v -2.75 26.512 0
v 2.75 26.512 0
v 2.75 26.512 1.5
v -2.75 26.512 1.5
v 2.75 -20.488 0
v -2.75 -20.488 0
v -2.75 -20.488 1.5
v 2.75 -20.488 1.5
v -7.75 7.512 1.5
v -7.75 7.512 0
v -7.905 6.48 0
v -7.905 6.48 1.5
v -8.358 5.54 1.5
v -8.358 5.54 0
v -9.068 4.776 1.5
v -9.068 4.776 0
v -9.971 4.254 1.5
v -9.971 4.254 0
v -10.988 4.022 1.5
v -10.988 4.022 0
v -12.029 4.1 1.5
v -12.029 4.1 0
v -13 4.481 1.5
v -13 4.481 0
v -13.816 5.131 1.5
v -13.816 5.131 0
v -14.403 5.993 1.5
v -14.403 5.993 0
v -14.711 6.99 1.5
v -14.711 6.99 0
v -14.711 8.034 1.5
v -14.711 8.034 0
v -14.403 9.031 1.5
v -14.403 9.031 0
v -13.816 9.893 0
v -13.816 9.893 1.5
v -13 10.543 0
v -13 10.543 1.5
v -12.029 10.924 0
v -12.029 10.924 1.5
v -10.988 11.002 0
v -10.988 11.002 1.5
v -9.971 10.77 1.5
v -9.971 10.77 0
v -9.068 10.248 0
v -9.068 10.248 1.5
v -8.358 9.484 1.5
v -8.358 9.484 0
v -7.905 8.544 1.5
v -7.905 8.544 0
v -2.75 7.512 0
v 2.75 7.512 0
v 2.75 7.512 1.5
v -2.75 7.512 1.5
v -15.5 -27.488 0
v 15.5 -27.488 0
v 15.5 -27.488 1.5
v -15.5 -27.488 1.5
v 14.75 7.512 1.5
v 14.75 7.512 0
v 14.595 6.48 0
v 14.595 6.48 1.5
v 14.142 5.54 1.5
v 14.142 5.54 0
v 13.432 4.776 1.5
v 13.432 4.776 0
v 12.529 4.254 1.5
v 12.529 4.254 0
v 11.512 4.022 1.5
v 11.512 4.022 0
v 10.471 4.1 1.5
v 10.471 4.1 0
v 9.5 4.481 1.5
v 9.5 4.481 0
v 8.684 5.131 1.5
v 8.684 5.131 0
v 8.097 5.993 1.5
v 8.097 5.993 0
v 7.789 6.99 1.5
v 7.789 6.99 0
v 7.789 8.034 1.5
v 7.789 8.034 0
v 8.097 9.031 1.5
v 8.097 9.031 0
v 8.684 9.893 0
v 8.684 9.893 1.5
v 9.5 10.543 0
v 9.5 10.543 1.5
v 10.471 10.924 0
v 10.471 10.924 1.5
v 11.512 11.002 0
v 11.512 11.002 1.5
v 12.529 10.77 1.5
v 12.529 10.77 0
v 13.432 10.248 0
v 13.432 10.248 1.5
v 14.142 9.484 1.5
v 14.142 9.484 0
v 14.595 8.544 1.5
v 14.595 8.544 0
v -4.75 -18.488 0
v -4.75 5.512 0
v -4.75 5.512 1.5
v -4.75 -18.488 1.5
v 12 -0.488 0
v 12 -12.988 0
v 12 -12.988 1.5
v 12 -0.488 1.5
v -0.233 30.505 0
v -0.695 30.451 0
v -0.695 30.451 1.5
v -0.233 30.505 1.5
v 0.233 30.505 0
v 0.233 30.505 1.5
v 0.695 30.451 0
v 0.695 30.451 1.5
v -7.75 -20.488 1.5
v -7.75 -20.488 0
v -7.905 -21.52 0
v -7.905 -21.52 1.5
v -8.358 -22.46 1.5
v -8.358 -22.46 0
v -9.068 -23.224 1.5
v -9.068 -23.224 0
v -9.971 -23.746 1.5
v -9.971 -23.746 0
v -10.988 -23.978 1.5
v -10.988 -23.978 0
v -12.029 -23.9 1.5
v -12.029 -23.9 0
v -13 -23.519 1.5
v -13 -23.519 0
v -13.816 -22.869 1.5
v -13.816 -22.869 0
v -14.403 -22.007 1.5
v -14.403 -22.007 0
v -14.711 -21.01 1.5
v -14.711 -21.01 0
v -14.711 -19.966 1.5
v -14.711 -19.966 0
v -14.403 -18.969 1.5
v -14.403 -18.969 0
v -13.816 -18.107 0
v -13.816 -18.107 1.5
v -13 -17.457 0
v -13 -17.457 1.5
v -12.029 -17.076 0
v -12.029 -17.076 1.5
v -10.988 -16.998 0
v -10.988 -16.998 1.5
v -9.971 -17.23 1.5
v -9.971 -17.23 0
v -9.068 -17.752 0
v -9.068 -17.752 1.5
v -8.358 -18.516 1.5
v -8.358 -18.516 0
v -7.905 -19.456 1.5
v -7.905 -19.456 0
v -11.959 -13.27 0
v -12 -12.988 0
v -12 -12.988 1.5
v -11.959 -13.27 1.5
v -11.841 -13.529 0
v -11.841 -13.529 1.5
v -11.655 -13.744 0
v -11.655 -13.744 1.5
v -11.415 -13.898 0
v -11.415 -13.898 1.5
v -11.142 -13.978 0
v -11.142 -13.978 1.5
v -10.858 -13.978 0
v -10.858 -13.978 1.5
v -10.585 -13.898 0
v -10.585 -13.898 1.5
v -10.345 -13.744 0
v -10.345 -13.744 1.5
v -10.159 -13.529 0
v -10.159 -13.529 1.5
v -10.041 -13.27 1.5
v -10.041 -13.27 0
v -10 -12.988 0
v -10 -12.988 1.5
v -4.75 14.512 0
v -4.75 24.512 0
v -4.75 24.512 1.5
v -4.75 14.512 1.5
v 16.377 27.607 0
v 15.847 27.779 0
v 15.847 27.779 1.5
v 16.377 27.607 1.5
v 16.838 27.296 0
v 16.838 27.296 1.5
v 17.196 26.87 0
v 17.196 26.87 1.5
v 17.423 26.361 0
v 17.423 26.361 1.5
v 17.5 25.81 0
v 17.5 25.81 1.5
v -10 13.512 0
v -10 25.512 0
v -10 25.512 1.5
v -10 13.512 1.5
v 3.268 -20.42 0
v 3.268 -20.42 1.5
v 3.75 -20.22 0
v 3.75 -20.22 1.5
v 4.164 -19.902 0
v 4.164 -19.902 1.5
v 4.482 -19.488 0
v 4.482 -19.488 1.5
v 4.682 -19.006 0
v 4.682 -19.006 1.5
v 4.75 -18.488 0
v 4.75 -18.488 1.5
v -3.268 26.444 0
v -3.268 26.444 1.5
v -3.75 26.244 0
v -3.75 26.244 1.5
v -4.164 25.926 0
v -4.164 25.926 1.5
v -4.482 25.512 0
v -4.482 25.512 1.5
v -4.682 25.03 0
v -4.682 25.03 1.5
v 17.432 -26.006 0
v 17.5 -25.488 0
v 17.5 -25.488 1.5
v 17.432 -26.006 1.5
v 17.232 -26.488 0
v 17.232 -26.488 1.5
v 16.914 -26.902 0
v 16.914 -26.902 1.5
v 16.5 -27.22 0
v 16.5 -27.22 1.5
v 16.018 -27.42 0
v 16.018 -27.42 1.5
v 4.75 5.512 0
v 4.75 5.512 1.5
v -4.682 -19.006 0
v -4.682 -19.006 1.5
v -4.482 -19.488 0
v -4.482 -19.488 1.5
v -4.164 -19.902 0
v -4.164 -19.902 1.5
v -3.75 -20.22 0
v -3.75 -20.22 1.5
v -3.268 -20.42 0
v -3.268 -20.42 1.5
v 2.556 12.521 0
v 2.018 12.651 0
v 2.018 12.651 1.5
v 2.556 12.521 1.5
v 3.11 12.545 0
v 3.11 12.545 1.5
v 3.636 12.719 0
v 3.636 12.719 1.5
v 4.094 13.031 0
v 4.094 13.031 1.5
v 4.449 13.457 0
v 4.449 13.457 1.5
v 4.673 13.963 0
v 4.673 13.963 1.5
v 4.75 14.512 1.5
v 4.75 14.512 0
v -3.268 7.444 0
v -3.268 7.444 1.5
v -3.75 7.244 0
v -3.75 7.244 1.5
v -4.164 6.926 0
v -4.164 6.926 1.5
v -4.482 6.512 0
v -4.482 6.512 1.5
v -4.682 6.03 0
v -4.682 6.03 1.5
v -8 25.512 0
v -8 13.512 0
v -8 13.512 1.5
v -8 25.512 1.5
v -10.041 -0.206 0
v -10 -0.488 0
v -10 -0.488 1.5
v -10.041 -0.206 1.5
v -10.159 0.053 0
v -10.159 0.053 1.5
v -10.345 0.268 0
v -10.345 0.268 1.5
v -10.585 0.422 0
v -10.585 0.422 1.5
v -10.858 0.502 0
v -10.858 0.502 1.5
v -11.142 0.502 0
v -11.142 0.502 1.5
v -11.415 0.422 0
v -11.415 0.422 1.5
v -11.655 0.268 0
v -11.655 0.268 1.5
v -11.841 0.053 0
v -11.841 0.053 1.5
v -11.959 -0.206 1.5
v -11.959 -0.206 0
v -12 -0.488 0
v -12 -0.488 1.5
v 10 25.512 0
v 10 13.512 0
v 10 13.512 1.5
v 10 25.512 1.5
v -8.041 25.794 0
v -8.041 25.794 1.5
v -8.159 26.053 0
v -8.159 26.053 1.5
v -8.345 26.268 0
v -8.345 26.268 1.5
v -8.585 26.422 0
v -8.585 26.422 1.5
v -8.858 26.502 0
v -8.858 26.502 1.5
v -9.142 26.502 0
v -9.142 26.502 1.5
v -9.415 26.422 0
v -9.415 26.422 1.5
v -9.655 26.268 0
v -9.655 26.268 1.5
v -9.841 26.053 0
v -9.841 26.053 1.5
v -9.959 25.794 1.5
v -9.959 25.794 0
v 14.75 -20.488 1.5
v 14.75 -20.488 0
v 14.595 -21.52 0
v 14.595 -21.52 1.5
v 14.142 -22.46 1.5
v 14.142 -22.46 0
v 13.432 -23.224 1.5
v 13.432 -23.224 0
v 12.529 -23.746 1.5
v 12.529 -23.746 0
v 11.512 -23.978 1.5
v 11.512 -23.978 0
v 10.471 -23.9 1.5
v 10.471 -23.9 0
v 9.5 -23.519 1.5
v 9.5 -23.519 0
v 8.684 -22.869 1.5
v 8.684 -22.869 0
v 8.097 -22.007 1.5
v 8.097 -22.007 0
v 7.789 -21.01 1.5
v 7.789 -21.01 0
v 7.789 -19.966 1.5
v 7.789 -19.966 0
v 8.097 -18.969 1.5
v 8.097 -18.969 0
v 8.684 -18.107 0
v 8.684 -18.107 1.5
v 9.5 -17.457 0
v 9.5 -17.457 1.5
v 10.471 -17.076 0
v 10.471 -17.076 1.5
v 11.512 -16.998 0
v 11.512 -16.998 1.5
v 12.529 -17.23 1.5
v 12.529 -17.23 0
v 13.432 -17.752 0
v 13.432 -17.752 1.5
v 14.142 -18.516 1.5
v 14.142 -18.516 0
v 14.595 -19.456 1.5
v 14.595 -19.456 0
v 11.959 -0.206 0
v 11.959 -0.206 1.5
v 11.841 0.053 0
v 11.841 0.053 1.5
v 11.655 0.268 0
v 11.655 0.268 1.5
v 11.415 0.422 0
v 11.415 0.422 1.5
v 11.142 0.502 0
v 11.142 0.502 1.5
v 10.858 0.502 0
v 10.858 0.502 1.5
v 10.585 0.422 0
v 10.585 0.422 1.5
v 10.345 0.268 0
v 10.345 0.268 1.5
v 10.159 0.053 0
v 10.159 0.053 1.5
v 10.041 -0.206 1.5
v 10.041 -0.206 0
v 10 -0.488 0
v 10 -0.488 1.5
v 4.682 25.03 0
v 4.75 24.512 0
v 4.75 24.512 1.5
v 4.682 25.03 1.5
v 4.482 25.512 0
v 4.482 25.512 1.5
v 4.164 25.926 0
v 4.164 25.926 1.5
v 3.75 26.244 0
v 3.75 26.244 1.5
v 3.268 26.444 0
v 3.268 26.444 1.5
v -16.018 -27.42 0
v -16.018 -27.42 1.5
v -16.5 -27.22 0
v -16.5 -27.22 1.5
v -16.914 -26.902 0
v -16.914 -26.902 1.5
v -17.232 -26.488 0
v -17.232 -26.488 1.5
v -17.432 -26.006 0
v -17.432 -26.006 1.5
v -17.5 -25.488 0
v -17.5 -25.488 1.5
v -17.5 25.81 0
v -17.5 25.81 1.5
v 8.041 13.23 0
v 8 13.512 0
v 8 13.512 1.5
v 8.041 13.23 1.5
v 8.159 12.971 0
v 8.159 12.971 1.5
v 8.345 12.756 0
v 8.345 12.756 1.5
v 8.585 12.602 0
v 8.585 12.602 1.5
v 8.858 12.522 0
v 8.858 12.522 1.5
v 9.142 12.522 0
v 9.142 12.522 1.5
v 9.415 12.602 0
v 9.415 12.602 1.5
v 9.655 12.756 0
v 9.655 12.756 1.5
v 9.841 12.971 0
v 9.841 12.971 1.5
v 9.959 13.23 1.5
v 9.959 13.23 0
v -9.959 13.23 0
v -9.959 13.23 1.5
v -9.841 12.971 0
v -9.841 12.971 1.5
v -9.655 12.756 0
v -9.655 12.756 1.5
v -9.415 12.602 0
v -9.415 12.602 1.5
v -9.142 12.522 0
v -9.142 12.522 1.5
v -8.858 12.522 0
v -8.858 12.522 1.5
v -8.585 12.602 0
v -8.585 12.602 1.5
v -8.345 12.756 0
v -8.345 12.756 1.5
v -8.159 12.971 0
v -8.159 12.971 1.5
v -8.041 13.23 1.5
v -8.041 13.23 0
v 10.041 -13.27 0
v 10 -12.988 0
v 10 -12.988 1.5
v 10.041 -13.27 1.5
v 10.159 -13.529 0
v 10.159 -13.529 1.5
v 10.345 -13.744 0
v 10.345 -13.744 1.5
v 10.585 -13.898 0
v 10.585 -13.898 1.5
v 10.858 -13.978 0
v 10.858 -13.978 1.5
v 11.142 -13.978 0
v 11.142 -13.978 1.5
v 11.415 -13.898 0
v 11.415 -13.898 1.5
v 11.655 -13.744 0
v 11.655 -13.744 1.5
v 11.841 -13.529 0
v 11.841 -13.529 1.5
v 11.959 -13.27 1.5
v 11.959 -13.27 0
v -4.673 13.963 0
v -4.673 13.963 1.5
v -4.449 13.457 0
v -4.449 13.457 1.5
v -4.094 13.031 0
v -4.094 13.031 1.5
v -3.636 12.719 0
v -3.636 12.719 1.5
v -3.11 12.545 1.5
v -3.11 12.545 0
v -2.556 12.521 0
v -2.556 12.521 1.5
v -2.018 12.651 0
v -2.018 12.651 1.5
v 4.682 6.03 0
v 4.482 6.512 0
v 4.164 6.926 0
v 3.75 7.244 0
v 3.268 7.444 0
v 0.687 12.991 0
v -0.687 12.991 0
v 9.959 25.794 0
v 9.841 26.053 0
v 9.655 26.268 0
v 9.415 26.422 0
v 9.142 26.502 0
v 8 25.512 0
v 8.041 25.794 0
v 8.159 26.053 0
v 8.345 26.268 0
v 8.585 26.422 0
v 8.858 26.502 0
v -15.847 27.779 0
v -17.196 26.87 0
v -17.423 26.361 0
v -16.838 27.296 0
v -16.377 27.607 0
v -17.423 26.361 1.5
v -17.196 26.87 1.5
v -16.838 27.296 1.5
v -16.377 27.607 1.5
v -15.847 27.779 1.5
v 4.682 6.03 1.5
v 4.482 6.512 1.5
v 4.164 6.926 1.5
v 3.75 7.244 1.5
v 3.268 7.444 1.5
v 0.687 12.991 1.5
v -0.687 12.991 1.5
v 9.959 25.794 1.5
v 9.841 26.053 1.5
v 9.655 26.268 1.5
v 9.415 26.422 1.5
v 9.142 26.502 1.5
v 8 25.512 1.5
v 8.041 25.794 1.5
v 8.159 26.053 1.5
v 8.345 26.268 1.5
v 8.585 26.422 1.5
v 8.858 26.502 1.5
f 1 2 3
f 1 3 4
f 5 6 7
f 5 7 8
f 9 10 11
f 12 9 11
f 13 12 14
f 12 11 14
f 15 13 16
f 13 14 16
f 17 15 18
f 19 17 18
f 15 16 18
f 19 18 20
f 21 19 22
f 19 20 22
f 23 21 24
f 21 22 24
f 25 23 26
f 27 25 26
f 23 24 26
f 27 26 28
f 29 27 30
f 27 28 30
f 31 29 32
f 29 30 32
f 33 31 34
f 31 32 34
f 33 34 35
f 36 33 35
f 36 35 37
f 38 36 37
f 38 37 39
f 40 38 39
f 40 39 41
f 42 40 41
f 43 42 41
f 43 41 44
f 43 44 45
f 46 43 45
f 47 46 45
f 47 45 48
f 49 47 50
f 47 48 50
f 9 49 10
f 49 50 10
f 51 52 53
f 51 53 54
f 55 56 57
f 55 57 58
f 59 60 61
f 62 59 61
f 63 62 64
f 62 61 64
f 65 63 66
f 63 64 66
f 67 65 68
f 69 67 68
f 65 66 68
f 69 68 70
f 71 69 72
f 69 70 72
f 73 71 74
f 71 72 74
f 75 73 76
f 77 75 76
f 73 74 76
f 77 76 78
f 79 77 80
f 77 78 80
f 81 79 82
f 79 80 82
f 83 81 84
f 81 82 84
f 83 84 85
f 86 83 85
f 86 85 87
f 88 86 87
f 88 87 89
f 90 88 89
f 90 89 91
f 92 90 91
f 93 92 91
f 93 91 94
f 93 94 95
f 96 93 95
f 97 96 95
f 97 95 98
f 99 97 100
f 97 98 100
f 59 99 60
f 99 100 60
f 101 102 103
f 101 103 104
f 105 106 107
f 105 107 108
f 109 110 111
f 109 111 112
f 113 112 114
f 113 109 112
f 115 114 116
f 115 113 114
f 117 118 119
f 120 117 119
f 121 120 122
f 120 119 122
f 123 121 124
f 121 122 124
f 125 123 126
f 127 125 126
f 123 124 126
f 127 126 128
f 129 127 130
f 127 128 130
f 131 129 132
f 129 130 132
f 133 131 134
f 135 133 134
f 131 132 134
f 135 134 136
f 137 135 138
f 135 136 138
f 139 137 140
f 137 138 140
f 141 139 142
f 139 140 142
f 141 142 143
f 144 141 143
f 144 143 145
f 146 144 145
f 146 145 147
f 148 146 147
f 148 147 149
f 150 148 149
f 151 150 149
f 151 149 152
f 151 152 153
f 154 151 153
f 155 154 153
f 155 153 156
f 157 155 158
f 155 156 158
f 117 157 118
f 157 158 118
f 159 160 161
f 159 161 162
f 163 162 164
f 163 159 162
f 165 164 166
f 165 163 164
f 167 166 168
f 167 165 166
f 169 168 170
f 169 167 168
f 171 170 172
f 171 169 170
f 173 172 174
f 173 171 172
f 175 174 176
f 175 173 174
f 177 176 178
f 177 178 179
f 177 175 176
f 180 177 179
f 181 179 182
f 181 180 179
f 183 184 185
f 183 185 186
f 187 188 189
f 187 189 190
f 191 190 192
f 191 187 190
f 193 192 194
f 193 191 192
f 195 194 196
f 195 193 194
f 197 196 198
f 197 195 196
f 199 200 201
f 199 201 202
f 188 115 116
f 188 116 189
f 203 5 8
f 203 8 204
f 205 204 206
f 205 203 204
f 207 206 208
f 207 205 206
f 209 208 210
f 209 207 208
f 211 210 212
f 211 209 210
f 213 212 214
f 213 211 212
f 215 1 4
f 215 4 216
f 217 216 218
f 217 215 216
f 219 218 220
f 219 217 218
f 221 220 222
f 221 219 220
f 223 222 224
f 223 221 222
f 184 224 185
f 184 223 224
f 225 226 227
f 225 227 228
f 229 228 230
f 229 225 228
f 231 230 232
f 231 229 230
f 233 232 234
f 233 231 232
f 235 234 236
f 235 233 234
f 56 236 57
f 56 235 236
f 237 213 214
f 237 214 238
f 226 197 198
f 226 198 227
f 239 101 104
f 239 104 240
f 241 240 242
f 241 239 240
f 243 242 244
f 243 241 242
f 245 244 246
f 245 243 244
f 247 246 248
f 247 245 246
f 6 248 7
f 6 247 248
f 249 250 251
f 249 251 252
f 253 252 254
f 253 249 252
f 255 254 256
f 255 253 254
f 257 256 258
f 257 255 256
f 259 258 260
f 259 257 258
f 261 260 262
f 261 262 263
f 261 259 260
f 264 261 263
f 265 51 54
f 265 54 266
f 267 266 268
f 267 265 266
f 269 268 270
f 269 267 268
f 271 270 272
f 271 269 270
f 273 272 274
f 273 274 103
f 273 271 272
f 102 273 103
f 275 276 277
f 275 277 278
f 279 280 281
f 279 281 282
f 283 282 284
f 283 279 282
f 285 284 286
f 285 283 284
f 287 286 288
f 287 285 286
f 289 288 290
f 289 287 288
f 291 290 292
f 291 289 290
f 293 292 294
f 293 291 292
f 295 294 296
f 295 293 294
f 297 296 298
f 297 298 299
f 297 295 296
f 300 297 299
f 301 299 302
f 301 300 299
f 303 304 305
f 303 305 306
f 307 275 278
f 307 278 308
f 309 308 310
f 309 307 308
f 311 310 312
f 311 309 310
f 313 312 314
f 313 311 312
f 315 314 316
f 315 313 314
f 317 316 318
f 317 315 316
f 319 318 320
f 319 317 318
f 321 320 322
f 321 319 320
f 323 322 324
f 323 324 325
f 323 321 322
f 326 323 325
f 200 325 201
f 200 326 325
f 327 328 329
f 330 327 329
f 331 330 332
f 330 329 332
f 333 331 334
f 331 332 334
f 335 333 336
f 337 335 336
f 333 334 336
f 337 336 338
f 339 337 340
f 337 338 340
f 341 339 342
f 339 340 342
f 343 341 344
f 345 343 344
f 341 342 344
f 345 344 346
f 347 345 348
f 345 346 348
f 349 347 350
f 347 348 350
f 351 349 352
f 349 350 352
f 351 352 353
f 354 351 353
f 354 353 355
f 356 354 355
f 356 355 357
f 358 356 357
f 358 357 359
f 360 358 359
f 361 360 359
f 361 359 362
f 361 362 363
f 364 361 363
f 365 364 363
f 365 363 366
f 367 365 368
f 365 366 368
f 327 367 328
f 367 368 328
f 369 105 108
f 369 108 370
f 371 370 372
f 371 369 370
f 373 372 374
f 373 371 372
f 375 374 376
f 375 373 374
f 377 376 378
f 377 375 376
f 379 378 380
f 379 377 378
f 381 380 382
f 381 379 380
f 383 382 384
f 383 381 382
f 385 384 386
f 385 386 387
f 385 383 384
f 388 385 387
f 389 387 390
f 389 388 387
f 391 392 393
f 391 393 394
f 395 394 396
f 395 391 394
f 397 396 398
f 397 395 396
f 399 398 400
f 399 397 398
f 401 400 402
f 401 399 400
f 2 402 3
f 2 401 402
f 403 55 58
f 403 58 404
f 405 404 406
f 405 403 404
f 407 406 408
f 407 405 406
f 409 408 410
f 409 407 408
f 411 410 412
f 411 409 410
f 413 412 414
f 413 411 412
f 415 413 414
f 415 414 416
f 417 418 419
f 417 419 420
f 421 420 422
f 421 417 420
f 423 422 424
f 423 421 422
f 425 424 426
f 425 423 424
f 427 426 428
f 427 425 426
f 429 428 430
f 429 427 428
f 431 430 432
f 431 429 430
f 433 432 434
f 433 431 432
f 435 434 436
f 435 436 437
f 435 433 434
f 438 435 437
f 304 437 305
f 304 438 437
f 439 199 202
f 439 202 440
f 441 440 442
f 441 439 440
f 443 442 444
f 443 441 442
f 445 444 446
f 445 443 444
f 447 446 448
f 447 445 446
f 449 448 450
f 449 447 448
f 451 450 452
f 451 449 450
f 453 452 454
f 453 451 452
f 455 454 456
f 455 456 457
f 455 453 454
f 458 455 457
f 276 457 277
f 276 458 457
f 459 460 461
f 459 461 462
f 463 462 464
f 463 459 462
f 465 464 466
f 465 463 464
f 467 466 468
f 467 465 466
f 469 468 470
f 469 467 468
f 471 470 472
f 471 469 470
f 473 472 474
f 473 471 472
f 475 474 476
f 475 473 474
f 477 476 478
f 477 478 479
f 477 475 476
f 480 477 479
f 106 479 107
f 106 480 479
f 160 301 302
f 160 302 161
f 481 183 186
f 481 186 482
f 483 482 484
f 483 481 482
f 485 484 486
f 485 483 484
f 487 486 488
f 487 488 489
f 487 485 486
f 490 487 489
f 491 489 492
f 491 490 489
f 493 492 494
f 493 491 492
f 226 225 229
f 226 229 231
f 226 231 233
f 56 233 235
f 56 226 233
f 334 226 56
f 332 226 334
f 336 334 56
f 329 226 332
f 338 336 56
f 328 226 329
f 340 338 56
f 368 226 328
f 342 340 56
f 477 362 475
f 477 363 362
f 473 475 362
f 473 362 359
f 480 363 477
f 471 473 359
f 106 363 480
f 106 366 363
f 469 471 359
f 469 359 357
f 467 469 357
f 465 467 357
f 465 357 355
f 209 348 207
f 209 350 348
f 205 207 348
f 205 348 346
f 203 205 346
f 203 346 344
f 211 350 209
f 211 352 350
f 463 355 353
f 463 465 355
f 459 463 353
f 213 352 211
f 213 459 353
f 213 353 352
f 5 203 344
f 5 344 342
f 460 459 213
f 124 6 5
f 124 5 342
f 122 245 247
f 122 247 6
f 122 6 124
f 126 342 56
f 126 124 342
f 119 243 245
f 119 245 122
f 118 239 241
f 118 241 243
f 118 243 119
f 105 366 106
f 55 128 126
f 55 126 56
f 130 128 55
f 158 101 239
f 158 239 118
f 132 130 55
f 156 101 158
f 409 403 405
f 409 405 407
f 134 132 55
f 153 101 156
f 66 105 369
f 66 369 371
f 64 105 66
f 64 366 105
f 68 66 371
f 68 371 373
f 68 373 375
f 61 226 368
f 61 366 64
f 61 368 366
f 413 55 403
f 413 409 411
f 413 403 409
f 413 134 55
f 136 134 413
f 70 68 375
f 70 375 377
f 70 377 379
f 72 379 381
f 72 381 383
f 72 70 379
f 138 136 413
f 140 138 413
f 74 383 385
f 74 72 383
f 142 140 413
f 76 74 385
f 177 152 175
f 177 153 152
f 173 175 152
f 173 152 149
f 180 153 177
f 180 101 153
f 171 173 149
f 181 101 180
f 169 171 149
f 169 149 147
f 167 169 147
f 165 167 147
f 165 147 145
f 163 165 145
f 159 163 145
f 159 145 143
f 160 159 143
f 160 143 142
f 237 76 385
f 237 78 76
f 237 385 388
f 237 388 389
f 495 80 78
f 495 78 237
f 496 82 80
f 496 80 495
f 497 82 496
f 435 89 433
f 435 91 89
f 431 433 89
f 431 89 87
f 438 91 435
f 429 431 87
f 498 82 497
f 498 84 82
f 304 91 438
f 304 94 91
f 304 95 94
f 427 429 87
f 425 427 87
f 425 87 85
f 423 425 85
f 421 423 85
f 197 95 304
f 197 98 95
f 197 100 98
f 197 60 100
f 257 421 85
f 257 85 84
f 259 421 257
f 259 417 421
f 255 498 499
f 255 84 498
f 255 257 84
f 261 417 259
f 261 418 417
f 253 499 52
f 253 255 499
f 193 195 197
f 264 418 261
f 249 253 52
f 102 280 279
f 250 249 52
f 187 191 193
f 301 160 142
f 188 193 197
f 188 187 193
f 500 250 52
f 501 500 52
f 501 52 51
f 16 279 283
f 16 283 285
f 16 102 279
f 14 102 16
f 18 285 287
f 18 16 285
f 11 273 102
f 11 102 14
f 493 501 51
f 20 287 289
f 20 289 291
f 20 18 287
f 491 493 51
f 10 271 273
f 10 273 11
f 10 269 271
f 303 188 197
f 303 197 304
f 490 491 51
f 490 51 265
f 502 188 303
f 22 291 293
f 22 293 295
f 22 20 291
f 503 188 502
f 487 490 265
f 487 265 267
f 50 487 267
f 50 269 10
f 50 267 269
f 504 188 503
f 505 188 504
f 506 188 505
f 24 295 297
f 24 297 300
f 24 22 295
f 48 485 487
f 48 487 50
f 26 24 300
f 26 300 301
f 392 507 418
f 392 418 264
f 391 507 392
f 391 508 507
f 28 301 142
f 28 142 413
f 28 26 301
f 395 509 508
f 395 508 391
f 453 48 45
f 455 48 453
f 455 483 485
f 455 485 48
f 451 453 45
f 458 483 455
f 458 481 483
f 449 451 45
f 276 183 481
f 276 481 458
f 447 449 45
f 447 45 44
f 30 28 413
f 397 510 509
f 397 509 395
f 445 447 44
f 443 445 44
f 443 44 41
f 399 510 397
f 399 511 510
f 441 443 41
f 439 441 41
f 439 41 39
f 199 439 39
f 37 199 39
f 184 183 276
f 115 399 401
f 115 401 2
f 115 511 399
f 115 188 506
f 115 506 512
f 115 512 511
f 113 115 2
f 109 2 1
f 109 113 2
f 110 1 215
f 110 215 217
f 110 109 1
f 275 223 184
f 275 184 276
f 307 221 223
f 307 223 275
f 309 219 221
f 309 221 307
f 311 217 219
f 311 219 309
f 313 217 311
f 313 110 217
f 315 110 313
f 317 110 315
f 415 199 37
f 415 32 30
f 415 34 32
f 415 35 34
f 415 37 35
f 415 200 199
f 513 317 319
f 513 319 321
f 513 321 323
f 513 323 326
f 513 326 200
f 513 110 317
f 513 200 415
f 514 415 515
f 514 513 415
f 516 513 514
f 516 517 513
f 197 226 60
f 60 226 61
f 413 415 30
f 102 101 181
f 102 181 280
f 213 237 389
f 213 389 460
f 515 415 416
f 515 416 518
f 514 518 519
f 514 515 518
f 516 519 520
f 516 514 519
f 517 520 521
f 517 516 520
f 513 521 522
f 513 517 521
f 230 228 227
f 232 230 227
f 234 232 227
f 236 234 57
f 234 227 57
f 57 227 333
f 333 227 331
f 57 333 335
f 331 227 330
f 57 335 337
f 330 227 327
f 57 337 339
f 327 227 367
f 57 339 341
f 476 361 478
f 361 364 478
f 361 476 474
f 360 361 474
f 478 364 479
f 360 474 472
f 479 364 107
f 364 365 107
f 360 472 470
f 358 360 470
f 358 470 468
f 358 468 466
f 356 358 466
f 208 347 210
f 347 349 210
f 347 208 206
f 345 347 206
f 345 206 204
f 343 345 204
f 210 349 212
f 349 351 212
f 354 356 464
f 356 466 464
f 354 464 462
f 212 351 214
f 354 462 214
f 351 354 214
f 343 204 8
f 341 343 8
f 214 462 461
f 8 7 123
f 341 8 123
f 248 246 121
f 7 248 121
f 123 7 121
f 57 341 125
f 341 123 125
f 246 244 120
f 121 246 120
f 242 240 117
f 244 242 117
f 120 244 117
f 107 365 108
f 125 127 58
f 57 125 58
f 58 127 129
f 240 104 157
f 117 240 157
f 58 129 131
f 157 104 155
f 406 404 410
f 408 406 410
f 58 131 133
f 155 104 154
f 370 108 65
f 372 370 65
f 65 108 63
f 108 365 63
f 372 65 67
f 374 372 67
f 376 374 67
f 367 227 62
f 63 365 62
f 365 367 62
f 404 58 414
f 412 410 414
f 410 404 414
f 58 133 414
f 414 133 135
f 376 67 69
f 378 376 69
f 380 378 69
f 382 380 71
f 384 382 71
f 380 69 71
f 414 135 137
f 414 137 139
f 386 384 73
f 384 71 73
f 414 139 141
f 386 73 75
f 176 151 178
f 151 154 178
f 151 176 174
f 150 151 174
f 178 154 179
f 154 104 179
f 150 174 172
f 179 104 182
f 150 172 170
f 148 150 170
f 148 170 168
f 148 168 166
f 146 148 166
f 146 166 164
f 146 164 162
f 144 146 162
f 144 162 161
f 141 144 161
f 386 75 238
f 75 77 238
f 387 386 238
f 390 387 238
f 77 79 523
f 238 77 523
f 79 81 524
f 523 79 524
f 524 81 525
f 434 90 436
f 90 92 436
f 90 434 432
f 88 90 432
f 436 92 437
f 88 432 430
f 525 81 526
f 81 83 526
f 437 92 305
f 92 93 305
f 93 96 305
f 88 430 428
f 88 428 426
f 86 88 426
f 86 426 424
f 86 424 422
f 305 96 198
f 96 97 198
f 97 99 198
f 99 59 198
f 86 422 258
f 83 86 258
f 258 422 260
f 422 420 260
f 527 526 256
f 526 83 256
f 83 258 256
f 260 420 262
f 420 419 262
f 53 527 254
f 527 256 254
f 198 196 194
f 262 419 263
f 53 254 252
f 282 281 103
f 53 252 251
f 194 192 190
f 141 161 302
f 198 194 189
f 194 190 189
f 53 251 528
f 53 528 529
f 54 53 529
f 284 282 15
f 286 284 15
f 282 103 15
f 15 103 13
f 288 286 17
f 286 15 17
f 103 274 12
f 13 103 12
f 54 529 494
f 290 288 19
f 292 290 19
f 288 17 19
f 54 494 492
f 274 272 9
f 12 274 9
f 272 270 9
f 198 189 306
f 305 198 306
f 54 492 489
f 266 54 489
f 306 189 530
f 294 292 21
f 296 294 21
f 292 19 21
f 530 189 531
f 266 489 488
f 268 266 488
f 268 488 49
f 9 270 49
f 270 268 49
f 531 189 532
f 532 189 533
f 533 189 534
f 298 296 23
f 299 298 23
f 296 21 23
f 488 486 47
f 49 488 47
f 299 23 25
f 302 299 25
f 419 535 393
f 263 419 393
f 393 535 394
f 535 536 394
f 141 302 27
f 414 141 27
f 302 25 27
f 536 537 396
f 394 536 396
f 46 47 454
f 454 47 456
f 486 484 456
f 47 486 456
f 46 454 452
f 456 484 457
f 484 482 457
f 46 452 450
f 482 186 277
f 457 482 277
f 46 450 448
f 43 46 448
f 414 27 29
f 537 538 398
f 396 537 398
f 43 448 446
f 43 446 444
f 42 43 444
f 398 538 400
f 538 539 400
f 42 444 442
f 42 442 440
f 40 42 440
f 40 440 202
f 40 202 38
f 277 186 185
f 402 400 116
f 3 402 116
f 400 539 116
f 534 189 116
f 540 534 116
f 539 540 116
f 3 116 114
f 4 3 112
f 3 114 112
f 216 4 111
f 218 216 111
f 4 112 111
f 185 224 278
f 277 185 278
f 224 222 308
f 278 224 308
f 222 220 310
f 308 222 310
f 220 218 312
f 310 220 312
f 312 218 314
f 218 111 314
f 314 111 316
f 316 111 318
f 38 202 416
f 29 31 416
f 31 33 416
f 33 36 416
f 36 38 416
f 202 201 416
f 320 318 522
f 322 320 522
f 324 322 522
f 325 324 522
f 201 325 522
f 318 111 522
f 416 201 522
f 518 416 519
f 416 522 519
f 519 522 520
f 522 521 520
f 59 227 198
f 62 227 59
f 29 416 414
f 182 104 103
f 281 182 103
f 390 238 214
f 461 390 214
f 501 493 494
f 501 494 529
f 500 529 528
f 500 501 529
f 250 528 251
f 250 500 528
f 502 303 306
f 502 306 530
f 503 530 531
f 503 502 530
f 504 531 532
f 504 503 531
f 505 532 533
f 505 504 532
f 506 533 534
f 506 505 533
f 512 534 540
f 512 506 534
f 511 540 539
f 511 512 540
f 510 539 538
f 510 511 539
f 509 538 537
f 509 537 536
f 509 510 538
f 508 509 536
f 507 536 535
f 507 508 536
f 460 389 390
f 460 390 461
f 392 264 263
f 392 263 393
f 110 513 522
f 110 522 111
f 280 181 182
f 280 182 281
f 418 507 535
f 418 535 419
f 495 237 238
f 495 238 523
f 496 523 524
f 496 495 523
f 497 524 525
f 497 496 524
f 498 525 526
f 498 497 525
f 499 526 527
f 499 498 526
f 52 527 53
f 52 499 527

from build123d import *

# Parameters (mm, degrees)
CROQUIS1_R              = 3.5
SALIENTE_EXTRUIR1_DEPTH = 1.5


with BuildPart() as part:
    # Croquis1 → Saliente-Extruir1 (new body)
    with BuildSketch(Plane(origin=(0, 0, 0), x_dir=(-1, 0, 0), z_dir=(0, 0, -1))):
        with BuildLine():
            Line((15.847296355, 27.779408386), (0.694592711, 30.451238869))
            ThreePointArc((0.694592711, 30.451238869), (0, 30.512007857), (-0.694592711, 30.451238869))
            Line((-0.694592711, 30.451238869), (-15.847296355, 27.779408386))
            ThreePointArc((-15.847296355, 27.779408386), (-17.032088886, 27.0953681), (-17.5, 25.80979288))
            Line((-17.5, 25.80979288), (-17.5, -25.487992143))
            ThreePointArc((-17.5, -25.487992143), (-16.914213562, -26.902205705), (-15.5, -27.487992143))
            Line((-15.5, -27.487992143), (15.5, -27.487992143))
            ThreePointArc((15.5, -27.487992143), (16.914213562, -26.902205705), (17.5, -25.487992143))
            Line((17.5, -25.487992143), (17.5, 25.80979288))
            ThreePointArc((17.5, 25.80979288), (17.032088886, 27.0953681), (15.847296355, 27.779408386))
        make_face()
        with Locations(Location((11.25, 7.512007857, 0), (0, 0, 180))):
            Circle(CROQUIS1_R, mode=Mode.SUBTRACT)
        with Locations(Location((11.25, -20.487992143, 0), (0, 0, 180))):
            Circle(CROQUIS1_R, mode=Mode.SUBTRACT)
        with Locations(Location((-11.25, -20.487992143, 0), (0, 0, 180))):
            Circle(CROQUIS1_R, mode=Mode.SUBTRACT)
        with Locations(Location((-11.25, 7.512007857, 0), (0, 0, 180))):
            Circle(CROQUIS1_R, mode=Mode.SUBTRACT)
        with BuildLine():
            Line((-4.75, 14.512007857), (-4.75, 24.512007857))
            ThreePointArc((-4.75, 24.512007857), (-4.164213562, 25.92622142), (-2.75, 26.512007857))
            Line((-2.75, 26.512007857), (2.75, 26.512007857))
            ThreePointArc((2.75, 26.512007857), (4.164213562, 25.92622142), (4.75, 24.512007857))
            Line((4.75, 24.512007857), (4.75, 14.512007857))
            ThreePointArc((4.75, 14.512007857), (3.875930191, 12.859046513), (2.017718795, 12.650888776))
            ThreePointArc((2.017718795, 12.650888776), (0, 13.033559582), (-2.017718795, 12.650888776))
            ThreePointArc((-2.017718795, 12.650888776), (-3.875930191, 12.859046513), (-4.75, 14.512007857))
        make_face(mode=Mode.SUBTRACT)
        with BuildLine():
            Line((4.75, 5.512007857), (4.75, -18.487992143))
            ThreePointArc((4.75, -18.487992143), (4.164213562, -19.902205705), (2.75, -20.487992143))
            Line((2.75, -20.487992143), (-2.75, -20.487992143))
            ThreePointArc((-2.75, -20.487992143), (-4.164213562, -19.902205705), (-4.75, -18.487992143))
            Line((-4.75, -18.487992143), (-4.75, 5.512007857))
            ThreePointArc((-4.75, 5.512007857), (-4.164213562, 6.92622142), (-2.75, 7.512007857))
            Line((-2.75, 7.512007857), (2.75, 7.512007857))
            ThreePointArc((2.75, 7.512007857), (4.164213562, 6.92622142), (4.75, 5.512007857))
        make_face(mode=Mode.SUBTRACT)
        with BuildLine():
            Line((12, -0.487992143), (12, -12.987992143))
            ThreePointArc((12, -12.987992143), (11, -13.987992143), (10, -12.987992143))
            Line((10, -12.987992143), (10, -0.487992143))
            ThreePointArc((10, -0.487992143), (11, 0.512007857), (12, -0.487992143))
        make_face(mode=Mode.SUBTRACT)
        with BuildLine():
            Line((10, 25.512007857), (10, 13.512007857))
            ThreePointArc((10, 13.512007857), (9, 12.512007857), (8, 13.512007857))
            Line((8, 13.512007857), (8, 25.512007857))
            ThreePointArc((8, 25.512007857), (9, 26.512007857), (10, 25.512007857))
        make_face(mode=Mode.SUBTRACT)
        with BuildLine():
            Line((-10, -0.487992143), (-10, -12.987992143))
            ThreePointArc((-10, -12.987992143), (-11, -13.987992143), (-12, -12.987992143))
            Line((-12, -12.987992143), (-12, -0.487992143))
            ThreePointArc((-12, -0.487992143), (-11, 0.512007857), (-10, -0.487992143))
        make_face(mode=Mode.SUBTRACT)
        with BuildLine():
            Line((-8, 25.512007857), (-8, 13.512007857))
            ThreePointArc((-8, 13.512007857), (-9, 12.512007857), (-10, 13.512007857))
            Line((-10, 13.512007857), (-10, 25.512007857))
            ThreePointArc((-10, 25.512007857), (-9, 26.512007857), (-8, 25.512007857))
        make_face(mode=Mode.SUBTRACT)
    extrude(amount=-SALIENTE_EXTRUIR1_DEPTH)


solid = part.part
